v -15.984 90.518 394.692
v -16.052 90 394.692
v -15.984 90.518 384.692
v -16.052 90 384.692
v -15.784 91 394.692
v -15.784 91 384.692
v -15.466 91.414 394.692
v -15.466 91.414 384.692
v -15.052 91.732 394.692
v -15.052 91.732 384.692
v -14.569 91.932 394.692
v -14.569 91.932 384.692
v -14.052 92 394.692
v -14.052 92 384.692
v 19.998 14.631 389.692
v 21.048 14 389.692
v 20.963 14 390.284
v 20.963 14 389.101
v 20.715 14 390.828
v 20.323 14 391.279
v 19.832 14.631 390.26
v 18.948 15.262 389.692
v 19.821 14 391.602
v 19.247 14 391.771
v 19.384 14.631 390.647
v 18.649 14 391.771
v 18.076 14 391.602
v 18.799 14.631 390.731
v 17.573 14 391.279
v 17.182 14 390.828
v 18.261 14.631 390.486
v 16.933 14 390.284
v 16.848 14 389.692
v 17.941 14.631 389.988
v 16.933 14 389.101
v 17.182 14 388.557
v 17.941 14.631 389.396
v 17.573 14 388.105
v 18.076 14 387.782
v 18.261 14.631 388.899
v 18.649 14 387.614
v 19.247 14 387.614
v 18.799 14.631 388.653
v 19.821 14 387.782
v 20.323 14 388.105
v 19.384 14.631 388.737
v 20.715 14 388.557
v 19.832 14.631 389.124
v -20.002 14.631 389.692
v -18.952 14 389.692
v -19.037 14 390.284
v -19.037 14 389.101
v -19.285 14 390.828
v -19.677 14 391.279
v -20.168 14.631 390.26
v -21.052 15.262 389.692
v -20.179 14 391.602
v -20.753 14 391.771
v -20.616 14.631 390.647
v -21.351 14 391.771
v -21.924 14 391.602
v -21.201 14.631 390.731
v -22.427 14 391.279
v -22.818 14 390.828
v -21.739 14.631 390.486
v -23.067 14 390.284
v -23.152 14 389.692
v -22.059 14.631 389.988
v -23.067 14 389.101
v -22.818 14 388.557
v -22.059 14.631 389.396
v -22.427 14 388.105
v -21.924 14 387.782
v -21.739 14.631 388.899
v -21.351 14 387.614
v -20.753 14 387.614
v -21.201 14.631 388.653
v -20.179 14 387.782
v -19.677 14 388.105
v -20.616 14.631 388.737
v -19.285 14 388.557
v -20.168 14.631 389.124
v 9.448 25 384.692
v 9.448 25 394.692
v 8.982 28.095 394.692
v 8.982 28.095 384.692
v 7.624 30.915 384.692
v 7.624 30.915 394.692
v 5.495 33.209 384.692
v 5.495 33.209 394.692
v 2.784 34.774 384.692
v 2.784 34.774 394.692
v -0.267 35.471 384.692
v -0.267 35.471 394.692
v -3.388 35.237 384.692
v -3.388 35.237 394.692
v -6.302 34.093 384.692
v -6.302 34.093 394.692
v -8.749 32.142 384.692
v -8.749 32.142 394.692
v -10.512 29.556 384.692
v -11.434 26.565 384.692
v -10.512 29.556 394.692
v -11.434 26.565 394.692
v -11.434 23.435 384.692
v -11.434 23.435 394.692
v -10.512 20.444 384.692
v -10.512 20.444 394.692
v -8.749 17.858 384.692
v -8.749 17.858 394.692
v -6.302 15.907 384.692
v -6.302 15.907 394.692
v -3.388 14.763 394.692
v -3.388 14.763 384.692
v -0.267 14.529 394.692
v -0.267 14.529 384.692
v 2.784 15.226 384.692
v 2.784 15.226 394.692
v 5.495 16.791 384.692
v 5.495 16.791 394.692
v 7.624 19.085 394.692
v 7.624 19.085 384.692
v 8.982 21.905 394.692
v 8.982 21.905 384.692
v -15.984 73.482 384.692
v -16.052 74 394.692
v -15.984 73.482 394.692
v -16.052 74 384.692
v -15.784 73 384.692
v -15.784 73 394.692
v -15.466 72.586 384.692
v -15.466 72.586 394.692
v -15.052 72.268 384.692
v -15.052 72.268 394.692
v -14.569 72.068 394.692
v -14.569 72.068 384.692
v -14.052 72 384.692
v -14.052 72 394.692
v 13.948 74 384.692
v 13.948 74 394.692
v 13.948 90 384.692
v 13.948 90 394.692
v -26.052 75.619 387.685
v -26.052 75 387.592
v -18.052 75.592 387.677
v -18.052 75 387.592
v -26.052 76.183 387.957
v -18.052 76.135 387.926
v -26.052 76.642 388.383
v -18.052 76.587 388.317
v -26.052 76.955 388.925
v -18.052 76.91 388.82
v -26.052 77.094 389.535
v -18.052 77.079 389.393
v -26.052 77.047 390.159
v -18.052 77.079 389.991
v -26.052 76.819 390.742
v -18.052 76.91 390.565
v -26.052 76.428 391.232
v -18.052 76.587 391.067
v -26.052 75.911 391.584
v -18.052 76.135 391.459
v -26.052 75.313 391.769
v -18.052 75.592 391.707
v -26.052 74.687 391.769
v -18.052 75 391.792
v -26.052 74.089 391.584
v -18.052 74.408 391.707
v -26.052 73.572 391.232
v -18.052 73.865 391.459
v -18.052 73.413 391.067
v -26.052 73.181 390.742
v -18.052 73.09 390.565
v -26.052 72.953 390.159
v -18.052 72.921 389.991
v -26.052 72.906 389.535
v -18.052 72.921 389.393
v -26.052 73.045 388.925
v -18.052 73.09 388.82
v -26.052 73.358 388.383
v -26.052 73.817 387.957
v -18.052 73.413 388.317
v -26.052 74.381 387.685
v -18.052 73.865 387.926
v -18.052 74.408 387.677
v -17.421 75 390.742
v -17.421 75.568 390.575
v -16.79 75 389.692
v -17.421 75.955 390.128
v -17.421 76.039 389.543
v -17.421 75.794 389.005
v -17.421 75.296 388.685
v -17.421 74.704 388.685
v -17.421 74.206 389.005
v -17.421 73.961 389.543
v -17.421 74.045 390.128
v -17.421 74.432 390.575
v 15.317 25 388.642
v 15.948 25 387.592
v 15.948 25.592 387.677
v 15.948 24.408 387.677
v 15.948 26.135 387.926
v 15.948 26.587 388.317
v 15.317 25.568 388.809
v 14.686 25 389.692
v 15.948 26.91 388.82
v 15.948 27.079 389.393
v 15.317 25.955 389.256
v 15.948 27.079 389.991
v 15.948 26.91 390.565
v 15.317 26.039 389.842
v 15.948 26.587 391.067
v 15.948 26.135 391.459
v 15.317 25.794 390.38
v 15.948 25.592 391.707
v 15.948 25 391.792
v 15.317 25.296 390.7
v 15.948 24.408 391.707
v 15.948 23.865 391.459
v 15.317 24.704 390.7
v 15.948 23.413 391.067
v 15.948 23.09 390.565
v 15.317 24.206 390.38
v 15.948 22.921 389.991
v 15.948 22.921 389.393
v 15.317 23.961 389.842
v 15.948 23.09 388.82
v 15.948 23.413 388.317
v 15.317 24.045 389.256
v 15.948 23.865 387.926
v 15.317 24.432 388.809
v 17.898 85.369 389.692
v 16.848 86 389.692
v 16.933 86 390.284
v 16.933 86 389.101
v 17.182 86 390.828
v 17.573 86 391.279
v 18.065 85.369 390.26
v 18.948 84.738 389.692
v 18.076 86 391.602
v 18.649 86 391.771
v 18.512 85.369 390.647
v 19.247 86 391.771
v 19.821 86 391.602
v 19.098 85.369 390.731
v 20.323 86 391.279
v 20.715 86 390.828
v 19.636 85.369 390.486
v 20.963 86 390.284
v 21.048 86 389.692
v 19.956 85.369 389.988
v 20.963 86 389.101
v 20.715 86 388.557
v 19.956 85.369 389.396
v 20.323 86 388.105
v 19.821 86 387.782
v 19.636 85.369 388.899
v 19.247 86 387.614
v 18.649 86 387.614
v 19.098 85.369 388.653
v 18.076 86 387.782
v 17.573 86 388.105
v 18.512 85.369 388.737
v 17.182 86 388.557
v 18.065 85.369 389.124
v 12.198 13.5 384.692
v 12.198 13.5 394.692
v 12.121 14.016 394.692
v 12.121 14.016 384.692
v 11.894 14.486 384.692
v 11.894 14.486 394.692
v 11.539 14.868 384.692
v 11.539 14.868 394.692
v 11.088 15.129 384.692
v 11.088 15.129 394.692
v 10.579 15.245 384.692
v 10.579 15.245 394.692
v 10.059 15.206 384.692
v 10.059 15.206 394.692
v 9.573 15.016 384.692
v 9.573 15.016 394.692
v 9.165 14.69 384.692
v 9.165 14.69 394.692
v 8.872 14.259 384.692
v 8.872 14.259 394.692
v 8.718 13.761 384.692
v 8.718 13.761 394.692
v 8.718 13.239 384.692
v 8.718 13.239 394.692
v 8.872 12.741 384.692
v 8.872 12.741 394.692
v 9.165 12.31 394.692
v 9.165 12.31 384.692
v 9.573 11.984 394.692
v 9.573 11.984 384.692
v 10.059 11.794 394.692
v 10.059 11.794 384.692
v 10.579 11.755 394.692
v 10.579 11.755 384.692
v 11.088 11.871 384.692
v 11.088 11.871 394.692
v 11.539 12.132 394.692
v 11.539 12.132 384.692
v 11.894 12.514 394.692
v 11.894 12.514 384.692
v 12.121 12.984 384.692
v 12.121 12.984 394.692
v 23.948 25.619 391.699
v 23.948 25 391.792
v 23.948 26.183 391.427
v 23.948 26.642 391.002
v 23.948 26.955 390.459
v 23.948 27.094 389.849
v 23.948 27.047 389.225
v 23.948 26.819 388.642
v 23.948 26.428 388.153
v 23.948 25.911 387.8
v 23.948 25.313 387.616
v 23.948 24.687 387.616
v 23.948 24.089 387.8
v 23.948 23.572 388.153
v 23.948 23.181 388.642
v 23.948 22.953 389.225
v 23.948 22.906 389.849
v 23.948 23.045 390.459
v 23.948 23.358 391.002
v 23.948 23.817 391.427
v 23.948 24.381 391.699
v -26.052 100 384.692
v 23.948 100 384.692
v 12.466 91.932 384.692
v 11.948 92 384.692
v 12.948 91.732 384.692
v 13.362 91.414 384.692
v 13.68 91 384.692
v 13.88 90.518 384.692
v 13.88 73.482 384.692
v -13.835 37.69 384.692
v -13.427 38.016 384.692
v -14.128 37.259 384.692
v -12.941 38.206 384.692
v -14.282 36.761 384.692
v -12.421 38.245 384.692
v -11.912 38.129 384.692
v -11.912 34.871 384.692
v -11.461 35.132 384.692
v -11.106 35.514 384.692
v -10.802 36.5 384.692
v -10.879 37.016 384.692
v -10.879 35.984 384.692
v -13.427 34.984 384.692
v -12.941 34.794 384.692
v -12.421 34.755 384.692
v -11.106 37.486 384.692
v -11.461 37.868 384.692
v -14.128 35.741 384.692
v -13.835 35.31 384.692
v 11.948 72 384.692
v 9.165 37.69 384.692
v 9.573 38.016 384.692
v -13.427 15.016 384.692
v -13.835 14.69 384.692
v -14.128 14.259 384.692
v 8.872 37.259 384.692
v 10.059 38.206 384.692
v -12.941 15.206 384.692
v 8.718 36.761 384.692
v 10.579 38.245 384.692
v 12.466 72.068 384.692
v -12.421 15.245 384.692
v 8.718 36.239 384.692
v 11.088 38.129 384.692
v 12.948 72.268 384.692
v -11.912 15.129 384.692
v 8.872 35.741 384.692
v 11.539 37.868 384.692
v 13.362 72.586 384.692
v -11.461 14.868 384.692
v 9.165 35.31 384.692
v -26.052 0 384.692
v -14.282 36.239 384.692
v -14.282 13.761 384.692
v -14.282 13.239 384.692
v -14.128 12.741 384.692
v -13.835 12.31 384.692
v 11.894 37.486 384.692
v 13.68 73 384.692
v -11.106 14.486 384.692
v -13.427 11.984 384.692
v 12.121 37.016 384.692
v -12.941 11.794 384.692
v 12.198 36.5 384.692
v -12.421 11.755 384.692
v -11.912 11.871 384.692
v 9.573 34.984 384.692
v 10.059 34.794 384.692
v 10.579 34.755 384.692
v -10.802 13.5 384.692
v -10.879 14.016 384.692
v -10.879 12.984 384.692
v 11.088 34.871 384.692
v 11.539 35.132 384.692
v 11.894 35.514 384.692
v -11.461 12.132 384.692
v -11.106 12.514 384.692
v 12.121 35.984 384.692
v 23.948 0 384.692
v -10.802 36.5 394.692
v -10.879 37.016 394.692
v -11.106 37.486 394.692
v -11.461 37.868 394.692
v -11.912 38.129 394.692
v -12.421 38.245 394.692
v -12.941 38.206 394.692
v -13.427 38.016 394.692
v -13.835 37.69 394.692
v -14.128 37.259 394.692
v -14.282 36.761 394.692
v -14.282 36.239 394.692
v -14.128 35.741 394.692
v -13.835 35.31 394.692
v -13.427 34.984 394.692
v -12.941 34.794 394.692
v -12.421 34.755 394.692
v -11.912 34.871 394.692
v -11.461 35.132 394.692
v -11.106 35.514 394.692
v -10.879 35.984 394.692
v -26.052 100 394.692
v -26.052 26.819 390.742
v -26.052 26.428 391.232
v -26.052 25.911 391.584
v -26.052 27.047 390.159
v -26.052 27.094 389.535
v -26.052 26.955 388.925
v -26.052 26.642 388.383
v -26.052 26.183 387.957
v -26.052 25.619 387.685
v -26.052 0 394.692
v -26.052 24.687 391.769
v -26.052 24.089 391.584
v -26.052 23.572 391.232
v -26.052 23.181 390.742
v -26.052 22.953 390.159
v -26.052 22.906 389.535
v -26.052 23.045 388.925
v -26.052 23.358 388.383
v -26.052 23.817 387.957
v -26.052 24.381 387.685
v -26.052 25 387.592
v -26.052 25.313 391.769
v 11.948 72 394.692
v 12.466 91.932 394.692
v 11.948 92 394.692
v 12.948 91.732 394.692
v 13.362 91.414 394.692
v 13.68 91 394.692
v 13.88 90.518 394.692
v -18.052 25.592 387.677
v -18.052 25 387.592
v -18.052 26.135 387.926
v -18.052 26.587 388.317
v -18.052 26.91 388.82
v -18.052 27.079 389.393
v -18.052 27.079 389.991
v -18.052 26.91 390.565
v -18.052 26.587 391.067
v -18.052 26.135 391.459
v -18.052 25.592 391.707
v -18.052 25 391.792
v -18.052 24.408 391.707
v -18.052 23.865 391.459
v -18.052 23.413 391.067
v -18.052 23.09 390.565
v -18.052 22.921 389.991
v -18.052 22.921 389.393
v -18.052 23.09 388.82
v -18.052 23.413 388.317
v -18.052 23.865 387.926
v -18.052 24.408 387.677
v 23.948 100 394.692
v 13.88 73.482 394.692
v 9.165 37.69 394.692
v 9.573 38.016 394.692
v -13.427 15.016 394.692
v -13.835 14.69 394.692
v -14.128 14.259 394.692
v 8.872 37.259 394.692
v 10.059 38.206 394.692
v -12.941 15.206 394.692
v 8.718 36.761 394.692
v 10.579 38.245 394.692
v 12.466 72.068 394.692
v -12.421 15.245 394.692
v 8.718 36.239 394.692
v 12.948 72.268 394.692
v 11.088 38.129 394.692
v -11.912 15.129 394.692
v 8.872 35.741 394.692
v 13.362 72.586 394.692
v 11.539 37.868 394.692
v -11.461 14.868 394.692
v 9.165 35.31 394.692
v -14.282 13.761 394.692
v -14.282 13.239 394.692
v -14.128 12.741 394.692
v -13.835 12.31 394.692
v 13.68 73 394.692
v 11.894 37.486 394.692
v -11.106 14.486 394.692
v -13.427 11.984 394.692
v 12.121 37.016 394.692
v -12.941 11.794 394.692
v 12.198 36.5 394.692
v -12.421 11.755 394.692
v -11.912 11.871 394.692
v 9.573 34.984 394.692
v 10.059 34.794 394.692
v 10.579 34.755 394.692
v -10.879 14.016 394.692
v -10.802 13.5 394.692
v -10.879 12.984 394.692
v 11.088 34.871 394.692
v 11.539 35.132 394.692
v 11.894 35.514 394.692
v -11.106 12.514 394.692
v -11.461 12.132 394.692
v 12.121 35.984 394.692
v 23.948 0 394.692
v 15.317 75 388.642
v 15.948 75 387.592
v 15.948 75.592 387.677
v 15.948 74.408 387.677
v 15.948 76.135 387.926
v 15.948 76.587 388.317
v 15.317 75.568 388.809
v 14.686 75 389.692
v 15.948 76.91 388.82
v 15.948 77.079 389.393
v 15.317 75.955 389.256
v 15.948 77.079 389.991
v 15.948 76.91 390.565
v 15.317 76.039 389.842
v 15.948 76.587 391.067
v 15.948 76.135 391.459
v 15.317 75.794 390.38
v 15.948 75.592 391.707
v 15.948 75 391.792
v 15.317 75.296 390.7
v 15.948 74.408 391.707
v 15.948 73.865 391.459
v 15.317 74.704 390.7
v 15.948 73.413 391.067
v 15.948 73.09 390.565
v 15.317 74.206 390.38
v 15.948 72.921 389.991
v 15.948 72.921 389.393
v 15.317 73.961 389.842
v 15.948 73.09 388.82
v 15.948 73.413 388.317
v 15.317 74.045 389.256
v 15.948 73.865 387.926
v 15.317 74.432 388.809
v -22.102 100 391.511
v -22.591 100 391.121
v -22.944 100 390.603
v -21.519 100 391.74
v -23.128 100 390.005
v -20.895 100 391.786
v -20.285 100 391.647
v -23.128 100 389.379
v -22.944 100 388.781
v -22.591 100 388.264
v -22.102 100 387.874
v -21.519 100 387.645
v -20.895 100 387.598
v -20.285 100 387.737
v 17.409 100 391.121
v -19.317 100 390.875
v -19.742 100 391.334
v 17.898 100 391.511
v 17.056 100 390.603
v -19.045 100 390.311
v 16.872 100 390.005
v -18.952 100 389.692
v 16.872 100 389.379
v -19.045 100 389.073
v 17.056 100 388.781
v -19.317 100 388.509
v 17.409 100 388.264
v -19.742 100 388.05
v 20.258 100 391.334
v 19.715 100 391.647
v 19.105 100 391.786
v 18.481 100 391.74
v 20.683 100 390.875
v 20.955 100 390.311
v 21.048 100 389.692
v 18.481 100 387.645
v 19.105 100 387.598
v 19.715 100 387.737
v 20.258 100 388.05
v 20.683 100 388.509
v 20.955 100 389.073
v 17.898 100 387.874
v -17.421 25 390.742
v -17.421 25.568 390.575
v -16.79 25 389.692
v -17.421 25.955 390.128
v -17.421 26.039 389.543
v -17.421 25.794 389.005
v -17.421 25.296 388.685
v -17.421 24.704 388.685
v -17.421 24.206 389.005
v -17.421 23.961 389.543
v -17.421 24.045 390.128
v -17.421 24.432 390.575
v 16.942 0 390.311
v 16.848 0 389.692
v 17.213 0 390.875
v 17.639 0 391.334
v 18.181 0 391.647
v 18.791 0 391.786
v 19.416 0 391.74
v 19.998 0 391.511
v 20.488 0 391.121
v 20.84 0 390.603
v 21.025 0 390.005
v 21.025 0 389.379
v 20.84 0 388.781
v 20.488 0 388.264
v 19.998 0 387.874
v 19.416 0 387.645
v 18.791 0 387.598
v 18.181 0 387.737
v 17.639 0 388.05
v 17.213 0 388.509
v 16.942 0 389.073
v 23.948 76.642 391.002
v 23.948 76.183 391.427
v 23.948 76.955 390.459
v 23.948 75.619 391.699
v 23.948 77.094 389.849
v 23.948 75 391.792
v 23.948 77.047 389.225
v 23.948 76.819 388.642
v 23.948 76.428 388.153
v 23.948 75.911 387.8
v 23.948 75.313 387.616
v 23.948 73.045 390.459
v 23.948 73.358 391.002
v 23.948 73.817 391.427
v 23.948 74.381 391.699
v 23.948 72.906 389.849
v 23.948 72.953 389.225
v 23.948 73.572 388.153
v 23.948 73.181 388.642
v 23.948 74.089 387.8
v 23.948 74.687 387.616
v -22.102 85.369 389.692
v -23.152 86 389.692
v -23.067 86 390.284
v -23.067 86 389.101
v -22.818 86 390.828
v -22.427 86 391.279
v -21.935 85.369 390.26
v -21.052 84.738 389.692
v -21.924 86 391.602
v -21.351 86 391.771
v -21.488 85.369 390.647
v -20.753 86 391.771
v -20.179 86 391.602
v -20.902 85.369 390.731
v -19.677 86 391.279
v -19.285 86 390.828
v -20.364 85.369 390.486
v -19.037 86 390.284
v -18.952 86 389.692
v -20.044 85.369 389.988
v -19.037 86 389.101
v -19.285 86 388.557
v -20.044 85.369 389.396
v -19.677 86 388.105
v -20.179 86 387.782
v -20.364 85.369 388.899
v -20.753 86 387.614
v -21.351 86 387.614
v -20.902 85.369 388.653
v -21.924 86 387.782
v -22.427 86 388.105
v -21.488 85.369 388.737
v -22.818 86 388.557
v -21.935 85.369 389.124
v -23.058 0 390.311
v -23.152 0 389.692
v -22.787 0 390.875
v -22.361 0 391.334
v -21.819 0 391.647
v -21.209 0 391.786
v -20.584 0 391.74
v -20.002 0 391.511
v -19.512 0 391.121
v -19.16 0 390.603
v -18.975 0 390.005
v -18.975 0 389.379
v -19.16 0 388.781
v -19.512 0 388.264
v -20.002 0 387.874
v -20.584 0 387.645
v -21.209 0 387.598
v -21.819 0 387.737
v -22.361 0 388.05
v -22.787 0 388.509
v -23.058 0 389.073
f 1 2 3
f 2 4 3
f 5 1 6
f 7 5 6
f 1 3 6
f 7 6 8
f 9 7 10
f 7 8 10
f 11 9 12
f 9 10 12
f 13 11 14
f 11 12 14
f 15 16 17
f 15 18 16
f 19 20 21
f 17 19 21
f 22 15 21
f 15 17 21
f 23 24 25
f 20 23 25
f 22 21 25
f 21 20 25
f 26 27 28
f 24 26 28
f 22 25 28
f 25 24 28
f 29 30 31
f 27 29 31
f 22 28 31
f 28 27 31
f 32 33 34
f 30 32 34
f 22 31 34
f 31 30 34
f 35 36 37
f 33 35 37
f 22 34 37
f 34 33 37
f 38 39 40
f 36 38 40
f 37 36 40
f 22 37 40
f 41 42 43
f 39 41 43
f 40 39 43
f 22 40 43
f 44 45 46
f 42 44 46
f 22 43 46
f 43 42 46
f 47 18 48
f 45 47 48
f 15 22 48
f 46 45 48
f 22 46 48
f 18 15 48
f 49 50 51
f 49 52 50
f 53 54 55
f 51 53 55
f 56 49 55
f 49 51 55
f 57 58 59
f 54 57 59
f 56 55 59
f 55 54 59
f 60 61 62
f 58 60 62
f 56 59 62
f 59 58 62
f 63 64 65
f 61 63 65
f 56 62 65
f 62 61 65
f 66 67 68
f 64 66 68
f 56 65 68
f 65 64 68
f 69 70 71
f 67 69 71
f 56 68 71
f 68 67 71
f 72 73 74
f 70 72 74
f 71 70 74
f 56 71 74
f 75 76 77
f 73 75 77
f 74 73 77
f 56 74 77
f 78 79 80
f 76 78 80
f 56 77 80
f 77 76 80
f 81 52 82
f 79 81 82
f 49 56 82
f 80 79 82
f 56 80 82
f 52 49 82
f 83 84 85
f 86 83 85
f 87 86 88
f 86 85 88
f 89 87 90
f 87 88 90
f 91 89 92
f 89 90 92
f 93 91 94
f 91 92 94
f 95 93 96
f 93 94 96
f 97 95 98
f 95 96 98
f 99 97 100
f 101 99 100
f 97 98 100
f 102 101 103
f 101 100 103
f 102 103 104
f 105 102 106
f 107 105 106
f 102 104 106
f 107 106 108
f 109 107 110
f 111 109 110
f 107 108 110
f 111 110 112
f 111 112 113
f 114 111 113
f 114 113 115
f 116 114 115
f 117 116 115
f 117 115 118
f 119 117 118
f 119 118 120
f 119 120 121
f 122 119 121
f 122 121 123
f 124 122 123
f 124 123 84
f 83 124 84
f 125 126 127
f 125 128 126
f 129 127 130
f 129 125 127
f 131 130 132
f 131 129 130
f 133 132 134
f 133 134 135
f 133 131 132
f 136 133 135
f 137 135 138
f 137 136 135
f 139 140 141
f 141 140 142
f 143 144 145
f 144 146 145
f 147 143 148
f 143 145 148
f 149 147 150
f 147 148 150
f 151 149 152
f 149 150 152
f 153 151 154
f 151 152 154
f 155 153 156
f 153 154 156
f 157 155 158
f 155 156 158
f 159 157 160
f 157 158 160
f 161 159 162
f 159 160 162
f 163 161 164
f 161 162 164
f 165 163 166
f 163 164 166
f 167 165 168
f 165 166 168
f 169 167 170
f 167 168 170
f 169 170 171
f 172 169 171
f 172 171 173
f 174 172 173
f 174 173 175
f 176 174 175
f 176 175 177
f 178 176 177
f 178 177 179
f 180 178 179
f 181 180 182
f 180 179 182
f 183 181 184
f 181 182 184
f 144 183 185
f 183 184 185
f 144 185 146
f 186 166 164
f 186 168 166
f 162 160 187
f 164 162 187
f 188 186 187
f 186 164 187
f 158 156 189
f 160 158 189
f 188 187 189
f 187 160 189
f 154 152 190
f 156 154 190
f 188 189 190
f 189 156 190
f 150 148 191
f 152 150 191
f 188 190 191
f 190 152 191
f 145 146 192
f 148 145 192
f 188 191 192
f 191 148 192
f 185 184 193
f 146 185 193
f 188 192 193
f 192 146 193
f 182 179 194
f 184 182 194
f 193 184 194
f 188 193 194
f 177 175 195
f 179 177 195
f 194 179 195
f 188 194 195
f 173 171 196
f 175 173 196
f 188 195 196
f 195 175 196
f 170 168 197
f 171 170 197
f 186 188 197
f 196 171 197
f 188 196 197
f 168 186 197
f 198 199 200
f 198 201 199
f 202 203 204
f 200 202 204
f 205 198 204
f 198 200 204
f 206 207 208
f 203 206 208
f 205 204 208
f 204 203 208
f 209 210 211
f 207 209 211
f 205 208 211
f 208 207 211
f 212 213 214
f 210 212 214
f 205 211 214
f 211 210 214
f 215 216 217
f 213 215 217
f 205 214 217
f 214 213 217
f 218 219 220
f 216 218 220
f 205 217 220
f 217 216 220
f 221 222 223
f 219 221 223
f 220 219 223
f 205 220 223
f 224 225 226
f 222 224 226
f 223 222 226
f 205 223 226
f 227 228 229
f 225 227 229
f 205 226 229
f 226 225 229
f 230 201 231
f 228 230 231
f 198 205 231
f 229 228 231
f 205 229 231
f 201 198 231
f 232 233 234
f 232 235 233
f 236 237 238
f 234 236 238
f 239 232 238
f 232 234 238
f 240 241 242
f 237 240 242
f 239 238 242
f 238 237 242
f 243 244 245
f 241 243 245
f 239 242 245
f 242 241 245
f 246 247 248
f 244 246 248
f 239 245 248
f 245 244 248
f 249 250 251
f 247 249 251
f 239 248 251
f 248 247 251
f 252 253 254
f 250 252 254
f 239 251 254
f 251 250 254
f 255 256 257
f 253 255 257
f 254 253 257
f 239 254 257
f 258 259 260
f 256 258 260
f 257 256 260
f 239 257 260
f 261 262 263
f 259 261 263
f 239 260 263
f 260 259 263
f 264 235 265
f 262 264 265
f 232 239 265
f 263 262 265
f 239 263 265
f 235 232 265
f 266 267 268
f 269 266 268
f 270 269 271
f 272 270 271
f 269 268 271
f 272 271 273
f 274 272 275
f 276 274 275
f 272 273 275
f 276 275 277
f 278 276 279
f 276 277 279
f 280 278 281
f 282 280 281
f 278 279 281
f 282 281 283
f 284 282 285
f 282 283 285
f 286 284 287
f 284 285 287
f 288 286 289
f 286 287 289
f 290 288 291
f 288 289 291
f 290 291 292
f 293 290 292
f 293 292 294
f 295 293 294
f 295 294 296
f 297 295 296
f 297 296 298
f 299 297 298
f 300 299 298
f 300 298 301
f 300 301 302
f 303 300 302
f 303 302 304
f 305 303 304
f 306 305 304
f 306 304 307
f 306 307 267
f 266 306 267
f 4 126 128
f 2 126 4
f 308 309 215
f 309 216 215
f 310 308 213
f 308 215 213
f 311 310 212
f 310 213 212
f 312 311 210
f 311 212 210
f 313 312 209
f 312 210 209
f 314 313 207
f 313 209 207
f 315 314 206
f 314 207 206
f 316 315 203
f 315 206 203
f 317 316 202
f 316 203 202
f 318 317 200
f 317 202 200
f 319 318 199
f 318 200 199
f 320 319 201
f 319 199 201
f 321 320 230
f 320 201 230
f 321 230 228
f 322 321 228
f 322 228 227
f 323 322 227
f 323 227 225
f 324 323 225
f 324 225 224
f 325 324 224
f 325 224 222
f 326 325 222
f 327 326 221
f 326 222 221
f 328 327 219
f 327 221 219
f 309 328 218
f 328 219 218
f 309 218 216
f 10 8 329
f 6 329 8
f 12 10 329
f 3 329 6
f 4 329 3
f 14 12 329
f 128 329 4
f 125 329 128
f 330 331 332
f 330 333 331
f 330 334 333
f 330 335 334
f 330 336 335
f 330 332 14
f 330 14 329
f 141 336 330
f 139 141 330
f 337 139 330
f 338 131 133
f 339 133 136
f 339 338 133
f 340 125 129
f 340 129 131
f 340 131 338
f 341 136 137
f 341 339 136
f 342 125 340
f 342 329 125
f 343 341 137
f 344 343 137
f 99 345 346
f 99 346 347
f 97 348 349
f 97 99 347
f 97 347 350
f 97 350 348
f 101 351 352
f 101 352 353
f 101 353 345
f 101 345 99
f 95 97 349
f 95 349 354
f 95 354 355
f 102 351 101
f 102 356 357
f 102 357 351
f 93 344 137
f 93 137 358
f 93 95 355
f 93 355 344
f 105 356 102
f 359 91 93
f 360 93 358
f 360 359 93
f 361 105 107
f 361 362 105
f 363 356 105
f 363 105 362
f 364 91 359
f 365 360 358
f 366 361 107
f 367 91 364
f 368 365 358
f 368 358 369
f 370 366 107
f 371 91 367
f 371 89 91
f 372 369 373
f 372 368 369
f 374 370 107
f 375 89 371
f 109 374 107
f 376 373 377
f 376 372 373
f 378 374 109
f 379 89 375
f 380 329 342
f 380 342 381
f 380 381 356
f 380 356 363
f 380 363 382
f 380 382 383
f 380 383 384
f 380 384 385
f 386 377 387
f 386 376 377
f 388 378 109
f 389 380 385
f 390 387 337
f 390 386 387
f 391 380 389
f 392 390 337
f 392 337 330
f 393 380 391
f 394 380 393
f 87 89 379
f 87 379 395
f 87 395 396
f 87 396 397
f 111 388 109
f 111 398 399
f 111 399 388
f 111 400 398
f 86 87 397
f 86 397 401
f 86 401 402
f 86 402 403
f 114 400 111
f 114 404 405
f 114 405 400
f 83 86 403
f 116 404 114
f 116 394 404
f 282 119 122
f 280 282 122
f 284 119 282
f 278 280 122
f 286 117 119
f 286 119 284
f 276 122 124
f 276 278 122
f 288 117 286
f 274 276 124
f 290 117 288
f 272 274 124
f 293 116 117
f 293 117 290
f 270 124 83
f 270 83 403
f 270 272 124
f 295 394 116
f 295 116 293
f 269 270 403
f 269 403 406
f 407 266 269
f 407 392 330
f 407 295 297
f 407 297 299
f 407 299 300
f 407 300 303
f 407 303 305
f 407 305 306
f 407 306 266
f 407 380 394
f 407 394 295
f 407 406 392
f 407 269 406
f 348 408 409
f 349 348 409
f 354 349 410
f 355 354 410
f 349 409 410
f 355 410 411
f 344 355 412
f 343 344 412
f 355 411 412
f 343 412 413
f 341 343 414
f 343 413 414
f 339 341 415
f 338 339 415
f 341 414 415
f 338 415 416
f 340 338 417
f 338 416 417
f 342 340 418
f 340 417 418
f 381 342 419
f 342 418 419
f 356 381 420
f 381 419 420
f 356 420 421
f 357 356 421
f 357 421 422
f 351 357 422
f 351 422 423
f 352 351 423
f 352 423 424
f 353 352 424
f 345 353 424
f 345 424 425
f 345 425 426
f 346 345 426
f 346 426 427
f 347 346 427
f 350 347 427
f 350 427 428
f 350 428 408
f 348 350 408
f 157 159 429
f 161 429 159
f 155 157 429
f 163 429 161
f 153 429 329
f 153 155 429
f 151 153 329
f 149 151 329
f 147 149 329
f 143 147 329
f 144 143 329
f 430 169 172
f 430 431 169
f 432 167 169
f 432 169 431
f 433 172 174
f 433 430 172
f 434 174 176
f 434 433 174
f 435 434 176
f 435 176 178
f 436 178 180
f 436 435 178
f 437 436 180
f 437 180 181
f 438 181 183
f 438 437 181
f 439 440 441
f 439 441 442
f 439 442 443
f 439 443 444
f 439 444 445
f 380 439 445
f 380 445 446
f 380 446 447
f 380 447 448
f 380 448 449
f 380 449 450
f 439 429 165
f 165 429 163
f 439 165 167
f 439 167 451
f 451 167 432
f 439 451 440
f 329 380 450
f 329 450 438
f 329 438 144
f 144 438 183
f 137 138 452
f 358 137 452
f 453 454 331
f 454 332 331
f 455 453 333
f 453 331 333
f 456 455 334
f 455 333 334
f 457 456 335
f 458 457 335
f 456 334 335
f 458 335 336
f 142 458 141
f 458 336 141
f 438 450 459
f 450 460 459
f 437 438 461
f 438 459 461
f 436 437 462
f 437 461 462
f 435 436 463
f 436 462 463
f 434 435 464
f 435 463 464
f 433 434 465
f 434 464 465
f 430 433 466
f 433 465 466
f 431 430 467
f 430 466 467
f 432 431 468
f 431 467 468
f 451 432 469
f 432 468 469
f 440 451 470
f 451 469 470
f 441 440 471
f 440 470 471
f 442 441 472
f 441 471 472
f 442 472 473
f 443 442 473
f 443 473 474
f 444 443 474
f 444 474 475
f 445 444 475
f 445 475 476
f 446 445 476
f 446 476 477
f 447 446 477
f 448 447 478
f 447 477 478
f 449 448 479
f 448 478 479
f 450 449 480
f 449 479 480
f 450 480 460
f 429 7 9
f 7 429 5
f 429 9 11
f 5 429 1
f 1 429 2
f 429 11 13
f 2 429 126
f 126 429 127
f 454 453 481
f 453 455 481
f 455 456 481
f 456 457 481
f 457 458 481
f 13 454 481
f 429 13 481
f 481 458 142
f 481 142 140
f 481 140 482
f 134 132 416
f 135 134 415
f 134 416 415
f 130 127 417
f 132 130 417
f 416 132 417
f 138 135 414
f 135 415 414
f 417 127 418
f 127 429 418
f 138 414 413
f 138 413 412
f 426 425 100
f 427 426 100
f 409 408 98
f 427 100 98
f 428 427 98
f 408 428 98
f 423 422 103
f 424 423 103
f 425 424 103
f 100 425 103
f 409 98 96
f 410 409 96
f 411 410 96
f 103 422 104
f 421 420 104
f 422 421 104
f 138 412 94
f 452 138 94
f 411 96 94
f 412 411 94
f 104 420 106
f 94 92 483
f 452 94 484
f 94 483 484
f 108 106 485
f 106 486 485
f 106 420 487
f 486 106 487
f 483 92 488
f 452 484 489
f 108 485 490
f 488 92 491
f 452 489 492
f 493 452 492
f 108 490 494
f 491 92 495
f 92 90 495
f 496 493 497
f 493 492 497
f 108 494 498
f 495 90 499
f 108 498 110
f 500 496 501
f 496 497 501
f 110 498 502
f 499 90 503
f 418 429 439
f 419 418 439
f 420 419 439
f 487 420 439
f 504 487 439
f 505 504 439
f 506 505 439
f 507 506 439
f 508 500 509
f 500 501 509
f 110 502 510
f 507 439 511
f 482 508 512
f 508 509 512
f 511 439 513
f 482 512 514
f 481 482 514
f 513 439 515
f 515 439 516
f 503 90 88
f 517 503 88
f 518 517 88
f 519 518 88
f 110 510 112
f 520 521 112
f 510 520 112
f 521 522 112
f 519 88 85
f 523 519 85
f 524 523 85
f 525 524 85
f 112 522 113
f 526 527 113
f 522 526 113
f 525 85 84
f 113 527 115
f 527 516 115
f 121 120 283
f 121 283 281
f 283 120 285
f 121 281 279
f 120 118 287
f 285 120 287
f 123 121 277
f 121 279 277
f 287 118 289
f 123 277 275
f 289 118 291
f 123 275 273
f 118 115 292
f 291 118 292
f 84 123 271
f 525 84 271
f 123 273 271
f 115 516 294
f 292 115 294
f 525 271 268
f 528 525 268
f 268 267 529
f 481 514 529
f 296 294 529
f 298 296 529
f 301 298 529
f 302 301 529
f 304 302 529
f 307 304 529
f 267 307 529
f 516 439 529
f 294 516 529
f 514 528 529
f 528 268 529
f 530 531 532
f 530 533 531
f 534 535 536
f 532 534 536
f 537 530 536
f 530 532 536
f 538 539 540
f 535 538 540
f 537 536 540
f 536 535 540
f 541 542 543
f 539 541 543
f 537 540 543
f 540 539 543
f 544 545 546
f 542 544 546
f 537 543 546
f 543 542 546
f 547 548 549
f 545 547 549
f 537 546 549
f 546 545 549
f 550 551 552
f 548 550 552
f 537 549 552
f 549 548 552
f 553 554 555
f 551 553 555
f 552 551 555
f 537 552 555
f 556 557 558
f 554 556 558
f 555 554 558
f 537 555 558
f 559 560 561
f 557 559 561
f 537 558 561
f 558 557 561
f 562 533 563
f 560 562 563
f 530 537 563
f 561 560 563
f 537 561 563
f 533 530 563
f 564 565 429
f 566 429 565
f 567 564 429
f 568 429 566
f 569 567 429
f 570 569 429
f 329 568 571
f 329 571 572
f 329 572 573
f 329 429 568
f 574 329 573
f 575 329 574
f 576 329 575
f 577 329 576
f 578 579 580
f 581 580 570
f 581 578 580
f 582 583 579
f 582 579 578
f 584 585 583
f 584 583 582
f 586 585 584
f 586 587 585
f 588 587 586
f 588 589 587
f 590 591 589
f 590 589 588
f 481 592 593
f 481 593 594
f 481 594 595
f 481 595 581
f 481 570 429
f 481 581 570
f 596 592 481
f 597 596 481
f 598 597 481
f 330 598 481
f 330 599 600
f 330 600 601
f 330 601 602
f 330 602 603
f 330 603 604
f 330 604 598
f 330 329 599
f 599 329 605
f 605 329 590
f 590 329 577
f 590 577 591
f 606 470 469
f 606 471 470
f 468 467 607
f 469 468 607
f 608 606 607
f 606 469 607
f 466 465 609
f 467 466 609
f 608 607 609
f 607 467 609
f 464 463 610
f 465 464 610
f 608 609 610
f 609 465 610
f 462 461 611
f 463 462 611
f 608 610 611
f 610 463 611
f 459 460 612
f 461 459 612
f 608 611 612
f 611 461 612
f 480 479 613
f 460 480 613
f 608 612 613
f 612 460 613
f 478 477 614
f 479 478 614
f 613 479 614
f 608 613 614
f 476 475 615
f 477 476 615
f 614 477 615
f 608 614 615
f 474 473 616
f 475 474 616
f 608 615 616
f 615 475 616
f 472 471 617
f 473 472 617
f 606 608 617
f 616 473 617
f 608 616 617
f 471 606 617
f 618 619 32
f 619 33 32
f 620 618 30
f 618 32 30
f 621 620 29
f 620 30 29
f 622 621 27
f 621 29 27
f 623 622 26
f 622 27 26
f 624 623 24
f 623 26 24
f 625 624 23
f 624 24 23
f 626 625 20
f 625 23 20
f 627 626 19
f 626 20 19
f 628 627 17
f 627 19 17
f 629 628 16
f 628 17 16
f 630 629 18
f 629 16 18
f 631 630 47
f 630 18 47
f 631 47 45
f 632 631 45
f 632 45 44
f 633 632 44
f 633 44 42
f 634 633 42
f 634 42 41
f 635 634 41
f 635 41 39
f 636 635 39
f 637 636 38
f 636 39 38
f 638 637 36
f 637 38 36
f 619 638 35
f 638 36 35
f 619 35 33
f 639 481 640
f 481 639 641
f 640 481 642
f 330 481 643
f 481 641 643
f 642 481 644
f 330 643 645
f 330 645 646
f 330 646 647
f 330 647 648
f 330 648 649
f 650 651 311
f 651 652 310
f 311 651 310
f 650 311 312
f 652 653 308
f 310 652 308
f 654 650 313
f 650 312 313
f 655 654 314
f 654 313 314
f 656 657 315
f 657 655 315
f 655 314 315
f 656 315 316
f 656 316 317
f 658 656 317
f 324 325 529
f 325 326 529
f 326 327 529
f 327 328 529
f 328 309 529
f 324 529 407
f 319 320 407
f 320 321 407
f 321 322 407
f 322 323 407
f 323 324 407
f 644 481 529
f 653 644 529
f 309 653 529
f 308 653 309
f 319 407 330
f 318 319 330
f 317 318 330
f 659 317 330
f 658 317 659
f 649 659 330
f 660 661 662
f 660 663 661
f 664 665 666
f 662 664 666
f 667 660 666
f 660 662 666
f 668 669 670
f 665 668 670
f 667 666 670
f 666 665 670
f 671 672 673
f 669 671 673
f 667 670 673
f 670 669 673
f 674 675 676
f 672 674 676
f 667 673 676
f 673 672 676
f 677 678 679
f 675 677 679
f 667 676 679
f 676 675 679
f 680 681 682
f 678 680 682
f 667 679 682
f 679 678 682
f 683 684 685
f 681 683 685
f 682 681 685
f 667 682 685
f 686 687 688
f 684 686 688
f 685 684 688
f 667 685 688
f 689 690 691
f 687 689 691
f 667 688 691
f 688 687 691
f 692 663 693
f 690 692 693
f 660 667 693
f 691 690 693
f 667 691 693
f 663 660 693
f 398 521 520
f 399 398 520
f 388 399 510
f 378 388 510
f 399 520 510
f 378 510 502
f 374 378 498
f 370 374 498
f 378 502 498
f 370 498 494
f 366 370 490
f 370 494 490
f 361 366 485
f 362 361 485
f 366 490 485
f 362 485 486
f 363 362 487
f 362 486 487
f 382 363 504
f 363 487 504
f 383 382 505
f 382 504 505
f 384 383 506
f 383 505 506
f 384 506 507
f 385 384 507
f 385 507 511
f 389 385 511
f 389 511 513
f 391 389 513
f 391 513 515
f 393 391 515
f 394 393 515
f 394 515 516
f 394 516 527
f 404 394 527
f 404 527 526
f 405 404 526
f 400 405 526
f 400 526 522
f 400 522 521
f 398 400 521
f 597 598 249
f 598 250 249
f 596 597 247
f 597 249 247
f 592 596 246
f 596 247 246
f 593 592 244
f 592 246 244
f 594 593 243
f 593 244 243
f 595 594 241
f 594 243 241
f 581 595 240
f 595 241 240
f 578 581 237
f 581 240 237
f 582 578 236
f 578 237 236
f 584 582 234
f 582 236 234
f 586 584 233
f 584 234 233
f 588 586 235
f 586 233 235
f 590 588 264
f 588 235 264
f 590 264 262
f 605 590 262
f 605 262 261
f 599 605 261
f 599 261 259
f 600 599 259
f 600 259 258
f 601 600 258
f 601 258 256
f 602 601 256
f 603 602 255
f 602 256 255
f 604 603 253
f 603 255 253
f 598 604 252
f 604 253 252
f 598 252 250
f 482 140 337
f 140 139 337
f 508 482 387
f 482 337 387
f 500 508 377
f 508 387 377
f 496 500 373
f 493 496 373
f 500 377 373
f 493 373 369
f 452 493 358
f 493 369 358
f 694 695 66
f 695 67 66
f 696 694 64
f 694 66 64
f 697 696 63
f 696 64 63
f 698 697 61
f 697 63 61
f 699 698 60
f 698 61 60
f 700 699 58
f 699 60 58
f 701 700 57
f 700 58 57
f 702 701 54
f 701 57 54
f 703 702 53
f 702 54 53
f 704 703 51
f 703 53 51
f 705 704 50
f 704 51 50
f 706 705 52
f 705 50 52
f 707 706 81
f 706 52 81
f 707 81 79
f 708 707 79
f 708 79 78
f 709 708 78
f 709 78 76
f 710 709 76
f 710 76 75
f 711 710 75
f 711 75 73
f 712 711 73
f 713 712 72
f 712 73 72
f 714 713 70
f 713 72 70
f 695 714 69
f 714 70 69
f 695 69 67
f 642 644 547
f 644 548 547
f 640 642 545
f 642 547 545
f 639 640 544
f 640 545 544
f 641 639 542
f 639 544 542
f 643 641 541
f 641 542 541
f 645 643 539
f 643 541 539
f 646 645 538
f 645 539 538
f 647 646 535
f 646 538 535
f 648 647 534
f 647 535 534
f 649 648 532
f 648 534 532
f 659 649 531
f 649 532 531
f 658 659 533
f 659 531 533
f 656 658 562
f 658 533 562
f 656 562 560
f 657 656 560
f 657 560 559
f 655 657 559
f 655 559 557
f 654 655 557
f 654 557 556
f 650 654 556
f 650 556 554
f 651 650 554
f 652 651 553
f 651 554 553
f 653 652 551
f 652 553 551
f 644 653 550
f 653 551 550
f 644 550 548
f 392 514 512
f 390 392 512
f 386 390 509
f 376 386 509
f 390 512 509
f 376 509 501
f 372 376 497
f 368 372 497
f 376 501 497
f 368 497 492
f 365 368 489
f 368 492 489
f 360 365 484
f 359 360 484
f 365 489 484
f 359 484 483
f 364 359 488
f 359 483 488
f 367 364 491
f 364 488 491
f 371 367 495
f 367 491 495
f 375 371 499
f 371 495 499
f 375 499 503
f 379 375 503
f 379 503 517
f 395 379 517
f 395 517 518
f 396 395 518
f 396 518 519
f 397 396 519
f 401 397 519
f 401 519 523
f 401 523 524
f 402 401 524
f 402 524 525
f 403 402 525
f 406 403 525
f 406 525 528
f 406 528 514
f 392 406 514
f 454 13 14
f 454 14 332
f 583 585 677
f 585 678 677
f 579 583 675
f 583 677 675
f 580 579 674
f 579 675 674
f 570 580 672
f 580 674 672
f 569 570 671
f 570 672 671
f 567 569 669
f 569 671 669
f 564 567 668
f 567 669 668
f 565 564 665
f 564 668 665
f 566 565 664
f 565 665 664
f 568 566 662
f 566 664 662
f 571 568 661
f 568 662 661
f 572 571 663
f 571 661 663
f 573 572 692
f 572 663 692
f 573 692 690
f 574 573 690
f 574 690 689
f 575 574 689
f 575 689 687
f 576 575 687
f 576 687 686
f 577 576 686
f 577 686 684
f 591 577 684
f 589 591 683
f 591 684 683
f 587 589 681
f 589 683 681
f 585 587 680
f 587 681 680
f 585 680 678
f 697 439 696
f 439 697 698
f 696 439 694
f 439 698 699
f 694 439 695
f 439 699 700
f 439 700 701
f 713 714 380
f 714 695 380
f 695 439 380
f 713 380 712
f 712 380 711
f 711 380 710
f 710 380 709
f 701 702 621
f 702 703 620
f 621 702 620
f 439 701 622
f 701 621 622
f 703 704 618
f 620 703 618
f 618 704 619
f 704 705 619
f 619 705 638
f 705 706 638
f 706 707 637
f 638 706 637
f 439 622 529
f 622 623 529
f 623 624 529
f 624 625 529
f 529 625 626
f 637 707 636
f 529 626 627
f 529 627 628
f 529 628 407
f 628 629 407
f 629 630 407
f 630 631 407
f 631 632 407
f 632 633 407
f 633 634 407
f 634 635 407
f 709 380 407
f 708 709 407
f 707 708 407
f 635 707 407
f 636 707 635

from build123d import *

# Parameters (mm, degrees)
SKETCH1_W                 = 50
SKETCH1_H                 = 10
BOSS_EXTRUDE1_DEPTH       = 100
M5X0_8_TAPPED_HOLE1_D     = 4.2
M5X0_8_TAPPED_HOLE1_DEPTH = 14
M5X0_8_TAPPED_HOLE1_TIP   = 1.2618073
M5X0_8_TAPPED_HOLE2_D     = 4.2
M5X0_8_TAPPED_HOLE2_DEPTH = 14
M5X0_8_TAPPED_HOLE2_TIP   = 1.2618073
M5X0_8_TAPPED_HOLE3_D     = 4.2
M5X0_8_TAPPED_HOLE3_DEPTH = 8
M5X0_8_TAPPED_HOLE3_TIP   = 1.2618073
M5X0_8_TAPPED_HOLE4_D     = 4.2
M5X0_8_TAPPED_HOLE4_DEPTH = 8
M5X0_8_TAPPED_HOLE4_TIP   = 1.2618073
CUT_EXTRUDE2_REACH        = 12
SKETCH11_R                = 10.5
SKETCH11_R_2              = 1.75
SKETCH11_W                = 30
SKETCH11_H                = 20
FILLET2_R                 = 2


with BuildPart() as part:
    # Sketch1 → Boss-Extrude1 (new body)
    with BuildSketch(Plane(origin=(0, 0, 0), x_dir=(1, 0, 0), z_dir=(0, 1, 0))):
        with Locations((-1.051745534, -389.692172039)):
            Rectangle(SKETCH1_W, SKETCH1_H)
    extrude(amount=BOSS_EXTRUDE1_DEPTH)

    # M5x0.8 Tapped Hole1
    with Locations(Plane.XZ):
        with Locations((18.948254466, 389.692172039), (-21.051745534, 389.692172039)):
            Hole(M5X0_8_TAPPED_HOLE1_D / 2, depth=M5X0_8_TAPPED_HOLE1_DEPTH)
            with Locations((0, 0, -(M5X0_8_TAPPED_HOLE1_DEPTH + M5X0_8_TAPPED_HOLE1_TIP / 2))):  # 118° drill point
                Cone(0, M5X0_8_TAPPED_HOLE1_D / 2, M5X0_8_TAPPED_HOLE1_TIP, mode=Mode.SUBTRACT)

    # M5x0.8 Tapped Hole2
    with Locations(Plane(origin=(0, 100, 0), x_dir=(-1, 0, 0), z_dir=(0, 1, 0))):
        with Locations((21.051745534, 389.692172039), (-18.948254466, 389.692172039)):
            Hole(M5X0_8_TAPPED_HOLE2_D / 2, depth=M5X0_8_TAPPED_HOLE2_DEPTH)
            with Locations((0, 0, -(M5X0_8_TAPPED_HOLE2_DEPTH + M5X0_8_TAPPED_HOLE2_TIP / 2))):  # 118° drill point
                Cone(0, M5X0_8_TAPPED_HOLE2_D / 2, M5X0_8_TAPPED_HOLE2_TIP, mode=Mode.SUBTRACT)

    # M5x0.8 Tapped Hole3
    with Locations(Plane.ZY.offset(26.051745534)):
        with Locations((389.692172039, 75), (389.692172039, 25)):
            Hole(M5X0_8_TAPPED_HOLE3_D / 2, depth=M5X0_8_TAPPED_HOLE3_DEPTH)
            with Locations((0, 0, -(M5X0_8_TAPPED_HOLE3_DEPTH + M5X0_8_TAPPED_HOLE3_TIP / 2))):  # 118° drill point
                Cone(0, M5X0_8_TAPPED_HOLE3_D / 2, M5X0_8_TAPPED_HOLE3_TIP, mode=Mode.SUBTRACT)

    # M5x0.8 Tapped Hole4
    with Locations(Plane(origin=(23.948254466, 0, 0), x_dir=(0, 0, -1), z_dir=(1, 0, 0))):
        with Locations((-389.692172039, 75), (-389.692172039, 25)):
            Hole(M5X0_8_TAPPED_HOLE4_D / 2, depth=M5X0_8_TAPPED_HOLE4_DEPTH)
            with Locations((0, 0, -(M5X0_8_TAPPED_HOLE4_DEPTH + M5X0_8_TAPPED_HOLE4_TIP / 2))):  # 118° drill point
                Cone(0, M5X0_8_TAPPED_HOLE4_D / 2, M5X0_8_TAPPED_HOLE4_TIP, mode=Mode.SUBTRACT)

    # Sketch11 → Cut-Extrude2 (cut, up to next)
    with BuildSketch(Plane.XY.offset(394.692172039), mode=Mode.PRIVATE) as cut_extrude2_sk1:
        with Locations((-1.051745534, 25)):
            Circle(SKETCH11_R)
    cut_extrude2_tool1 = extrude(cut_extrude2_sk1.sketch, amount=-CUT_EXTRUDE2_REACH, mode=Mode.PRIVATE) & part.part
    add(cut_extrude2_tool1.solids().sort_by_distance((-1.051746, 25, 394.692172))[0], mode=Mode.SUBTRACT)
    # Sketch11 → Cut-Extrude2 (cut, up to next)
    with BuildSketch(Plane.XY.offset(394.692172039), mode=Mode.PRIVATE) as cut_extrude2_sk2:
        with Locations((-12.551745534, 36.5)):
            Circle(SKETCH11_R_2)
    cut_extrude2_tool2 = extrude(cut_extrude2_sk2.sketch, amount=-CUT_EXTRUDE2_REACH, mode=Mode.PRIVATE) & part.part
    add(cut_extrude2_tool2.solids().sort_by_distance((-12.551746, 36.5, 394.692172))[0], mode=Mode.SUBTRACT)
    # Sketch11 → Cut-Extrude2 (cut, up to next)
    with BuildSketch(Plane.XY.offset(394.692172039), mode=Mode.PRIVATE) as cut_extrude2_sk3:
        with Locations((10.448254466, 36.5)):
            Circle(SKETCH11_R_2)
    cut_extrude2_tool3 = extrude(cut_extrude2_sk3.sketch, amount=-CUT_EXTRUDE2_REACH, mode=Mode.PRIVATE) & part.part
    add(cut_extrude2_tool3.solids().sort_by_distance((10.448254, 36.5, 394.692172))[0], mode=Mode.SUBTRACT)
    # Sketch11 → Cut-Extrude2 (cut, up to next)
    with BuildSketch(Plane.XY.offset(394.692172039), mode=Mode.PRIVATE) as cut_extrude2_sk4:
        with Locations((10.448254466, 13.5)):
            Circle(SKETCH11_R_2)
    cut_extrude2_tool4 = extrude(cut_extrude2_sk4.sketch, amount=-CUT_EXTRUDE2_REACH, mode=Mode.PRIVATE) & part.part
    add(cut_extrude2_tool4.solids().sort_by_distance((10.448254, 13.5, 394.692172))[0], mode=Mode.SUBTRACT)
    # Sketch11 → Cut-Extrude2 (cut, up to next)
    with BuildSketch(Plane.XY.offset(394.692172039), mode=Mode.PRIVATE) as cut_extrude2_sk5:
        with Locations((-12.551745534, 13.5)):
            Circle(SKETCH11_R_2)
    cut_extrude2_tool5 = extrude(cut_extrude2_sk5.sketch, amount=-CUT_EXTRUDE2_REACH, mode=Mode.PRIVATE) & part.part
    add(cut_extrude2_tool5.solids().sort_by_distance((-12.551746, 13.5, 394.692172))[0], mode=Mode.SUBTRACT)
    # Sketch11 → Cut-Extrude2 (cut, up to next)
    with BuildSketch(Plane.XY.offset(394.692172039), mode=Mode.PRIVATE) as cut_extrude2_sk6:
        with Locations((-1.051745534, 82)):
            Rectangle(SKETCH11_W, SKETCH11_H)
    cut_extrude2_tool6 = extrude(cut_extrude2_sk6.sketch, amount=-CUT_EXTRUDE2_REACH, mode=Mode.PRIVATE) & part.part
    add(cut_extrude2_tool6.solids().sort_by_distance((-1.051746, 82, 394.692172))[0], mode=Mode.SUBTRACT)

    # Fillet2
    fillet2_edges = [part.edges().sort_by_distance(p)[0] for p in [
        (-16.051745534, 72, 389.692172039),
        (-16.051745534, 92, 389.692172039),
        (13.948254466, 92, 389.692172039),
        (13.948254466, 72, 389.692172039),
    ]]
    fillet(fillet2_edges, radius=FILLET2_R)


solid = part.part
